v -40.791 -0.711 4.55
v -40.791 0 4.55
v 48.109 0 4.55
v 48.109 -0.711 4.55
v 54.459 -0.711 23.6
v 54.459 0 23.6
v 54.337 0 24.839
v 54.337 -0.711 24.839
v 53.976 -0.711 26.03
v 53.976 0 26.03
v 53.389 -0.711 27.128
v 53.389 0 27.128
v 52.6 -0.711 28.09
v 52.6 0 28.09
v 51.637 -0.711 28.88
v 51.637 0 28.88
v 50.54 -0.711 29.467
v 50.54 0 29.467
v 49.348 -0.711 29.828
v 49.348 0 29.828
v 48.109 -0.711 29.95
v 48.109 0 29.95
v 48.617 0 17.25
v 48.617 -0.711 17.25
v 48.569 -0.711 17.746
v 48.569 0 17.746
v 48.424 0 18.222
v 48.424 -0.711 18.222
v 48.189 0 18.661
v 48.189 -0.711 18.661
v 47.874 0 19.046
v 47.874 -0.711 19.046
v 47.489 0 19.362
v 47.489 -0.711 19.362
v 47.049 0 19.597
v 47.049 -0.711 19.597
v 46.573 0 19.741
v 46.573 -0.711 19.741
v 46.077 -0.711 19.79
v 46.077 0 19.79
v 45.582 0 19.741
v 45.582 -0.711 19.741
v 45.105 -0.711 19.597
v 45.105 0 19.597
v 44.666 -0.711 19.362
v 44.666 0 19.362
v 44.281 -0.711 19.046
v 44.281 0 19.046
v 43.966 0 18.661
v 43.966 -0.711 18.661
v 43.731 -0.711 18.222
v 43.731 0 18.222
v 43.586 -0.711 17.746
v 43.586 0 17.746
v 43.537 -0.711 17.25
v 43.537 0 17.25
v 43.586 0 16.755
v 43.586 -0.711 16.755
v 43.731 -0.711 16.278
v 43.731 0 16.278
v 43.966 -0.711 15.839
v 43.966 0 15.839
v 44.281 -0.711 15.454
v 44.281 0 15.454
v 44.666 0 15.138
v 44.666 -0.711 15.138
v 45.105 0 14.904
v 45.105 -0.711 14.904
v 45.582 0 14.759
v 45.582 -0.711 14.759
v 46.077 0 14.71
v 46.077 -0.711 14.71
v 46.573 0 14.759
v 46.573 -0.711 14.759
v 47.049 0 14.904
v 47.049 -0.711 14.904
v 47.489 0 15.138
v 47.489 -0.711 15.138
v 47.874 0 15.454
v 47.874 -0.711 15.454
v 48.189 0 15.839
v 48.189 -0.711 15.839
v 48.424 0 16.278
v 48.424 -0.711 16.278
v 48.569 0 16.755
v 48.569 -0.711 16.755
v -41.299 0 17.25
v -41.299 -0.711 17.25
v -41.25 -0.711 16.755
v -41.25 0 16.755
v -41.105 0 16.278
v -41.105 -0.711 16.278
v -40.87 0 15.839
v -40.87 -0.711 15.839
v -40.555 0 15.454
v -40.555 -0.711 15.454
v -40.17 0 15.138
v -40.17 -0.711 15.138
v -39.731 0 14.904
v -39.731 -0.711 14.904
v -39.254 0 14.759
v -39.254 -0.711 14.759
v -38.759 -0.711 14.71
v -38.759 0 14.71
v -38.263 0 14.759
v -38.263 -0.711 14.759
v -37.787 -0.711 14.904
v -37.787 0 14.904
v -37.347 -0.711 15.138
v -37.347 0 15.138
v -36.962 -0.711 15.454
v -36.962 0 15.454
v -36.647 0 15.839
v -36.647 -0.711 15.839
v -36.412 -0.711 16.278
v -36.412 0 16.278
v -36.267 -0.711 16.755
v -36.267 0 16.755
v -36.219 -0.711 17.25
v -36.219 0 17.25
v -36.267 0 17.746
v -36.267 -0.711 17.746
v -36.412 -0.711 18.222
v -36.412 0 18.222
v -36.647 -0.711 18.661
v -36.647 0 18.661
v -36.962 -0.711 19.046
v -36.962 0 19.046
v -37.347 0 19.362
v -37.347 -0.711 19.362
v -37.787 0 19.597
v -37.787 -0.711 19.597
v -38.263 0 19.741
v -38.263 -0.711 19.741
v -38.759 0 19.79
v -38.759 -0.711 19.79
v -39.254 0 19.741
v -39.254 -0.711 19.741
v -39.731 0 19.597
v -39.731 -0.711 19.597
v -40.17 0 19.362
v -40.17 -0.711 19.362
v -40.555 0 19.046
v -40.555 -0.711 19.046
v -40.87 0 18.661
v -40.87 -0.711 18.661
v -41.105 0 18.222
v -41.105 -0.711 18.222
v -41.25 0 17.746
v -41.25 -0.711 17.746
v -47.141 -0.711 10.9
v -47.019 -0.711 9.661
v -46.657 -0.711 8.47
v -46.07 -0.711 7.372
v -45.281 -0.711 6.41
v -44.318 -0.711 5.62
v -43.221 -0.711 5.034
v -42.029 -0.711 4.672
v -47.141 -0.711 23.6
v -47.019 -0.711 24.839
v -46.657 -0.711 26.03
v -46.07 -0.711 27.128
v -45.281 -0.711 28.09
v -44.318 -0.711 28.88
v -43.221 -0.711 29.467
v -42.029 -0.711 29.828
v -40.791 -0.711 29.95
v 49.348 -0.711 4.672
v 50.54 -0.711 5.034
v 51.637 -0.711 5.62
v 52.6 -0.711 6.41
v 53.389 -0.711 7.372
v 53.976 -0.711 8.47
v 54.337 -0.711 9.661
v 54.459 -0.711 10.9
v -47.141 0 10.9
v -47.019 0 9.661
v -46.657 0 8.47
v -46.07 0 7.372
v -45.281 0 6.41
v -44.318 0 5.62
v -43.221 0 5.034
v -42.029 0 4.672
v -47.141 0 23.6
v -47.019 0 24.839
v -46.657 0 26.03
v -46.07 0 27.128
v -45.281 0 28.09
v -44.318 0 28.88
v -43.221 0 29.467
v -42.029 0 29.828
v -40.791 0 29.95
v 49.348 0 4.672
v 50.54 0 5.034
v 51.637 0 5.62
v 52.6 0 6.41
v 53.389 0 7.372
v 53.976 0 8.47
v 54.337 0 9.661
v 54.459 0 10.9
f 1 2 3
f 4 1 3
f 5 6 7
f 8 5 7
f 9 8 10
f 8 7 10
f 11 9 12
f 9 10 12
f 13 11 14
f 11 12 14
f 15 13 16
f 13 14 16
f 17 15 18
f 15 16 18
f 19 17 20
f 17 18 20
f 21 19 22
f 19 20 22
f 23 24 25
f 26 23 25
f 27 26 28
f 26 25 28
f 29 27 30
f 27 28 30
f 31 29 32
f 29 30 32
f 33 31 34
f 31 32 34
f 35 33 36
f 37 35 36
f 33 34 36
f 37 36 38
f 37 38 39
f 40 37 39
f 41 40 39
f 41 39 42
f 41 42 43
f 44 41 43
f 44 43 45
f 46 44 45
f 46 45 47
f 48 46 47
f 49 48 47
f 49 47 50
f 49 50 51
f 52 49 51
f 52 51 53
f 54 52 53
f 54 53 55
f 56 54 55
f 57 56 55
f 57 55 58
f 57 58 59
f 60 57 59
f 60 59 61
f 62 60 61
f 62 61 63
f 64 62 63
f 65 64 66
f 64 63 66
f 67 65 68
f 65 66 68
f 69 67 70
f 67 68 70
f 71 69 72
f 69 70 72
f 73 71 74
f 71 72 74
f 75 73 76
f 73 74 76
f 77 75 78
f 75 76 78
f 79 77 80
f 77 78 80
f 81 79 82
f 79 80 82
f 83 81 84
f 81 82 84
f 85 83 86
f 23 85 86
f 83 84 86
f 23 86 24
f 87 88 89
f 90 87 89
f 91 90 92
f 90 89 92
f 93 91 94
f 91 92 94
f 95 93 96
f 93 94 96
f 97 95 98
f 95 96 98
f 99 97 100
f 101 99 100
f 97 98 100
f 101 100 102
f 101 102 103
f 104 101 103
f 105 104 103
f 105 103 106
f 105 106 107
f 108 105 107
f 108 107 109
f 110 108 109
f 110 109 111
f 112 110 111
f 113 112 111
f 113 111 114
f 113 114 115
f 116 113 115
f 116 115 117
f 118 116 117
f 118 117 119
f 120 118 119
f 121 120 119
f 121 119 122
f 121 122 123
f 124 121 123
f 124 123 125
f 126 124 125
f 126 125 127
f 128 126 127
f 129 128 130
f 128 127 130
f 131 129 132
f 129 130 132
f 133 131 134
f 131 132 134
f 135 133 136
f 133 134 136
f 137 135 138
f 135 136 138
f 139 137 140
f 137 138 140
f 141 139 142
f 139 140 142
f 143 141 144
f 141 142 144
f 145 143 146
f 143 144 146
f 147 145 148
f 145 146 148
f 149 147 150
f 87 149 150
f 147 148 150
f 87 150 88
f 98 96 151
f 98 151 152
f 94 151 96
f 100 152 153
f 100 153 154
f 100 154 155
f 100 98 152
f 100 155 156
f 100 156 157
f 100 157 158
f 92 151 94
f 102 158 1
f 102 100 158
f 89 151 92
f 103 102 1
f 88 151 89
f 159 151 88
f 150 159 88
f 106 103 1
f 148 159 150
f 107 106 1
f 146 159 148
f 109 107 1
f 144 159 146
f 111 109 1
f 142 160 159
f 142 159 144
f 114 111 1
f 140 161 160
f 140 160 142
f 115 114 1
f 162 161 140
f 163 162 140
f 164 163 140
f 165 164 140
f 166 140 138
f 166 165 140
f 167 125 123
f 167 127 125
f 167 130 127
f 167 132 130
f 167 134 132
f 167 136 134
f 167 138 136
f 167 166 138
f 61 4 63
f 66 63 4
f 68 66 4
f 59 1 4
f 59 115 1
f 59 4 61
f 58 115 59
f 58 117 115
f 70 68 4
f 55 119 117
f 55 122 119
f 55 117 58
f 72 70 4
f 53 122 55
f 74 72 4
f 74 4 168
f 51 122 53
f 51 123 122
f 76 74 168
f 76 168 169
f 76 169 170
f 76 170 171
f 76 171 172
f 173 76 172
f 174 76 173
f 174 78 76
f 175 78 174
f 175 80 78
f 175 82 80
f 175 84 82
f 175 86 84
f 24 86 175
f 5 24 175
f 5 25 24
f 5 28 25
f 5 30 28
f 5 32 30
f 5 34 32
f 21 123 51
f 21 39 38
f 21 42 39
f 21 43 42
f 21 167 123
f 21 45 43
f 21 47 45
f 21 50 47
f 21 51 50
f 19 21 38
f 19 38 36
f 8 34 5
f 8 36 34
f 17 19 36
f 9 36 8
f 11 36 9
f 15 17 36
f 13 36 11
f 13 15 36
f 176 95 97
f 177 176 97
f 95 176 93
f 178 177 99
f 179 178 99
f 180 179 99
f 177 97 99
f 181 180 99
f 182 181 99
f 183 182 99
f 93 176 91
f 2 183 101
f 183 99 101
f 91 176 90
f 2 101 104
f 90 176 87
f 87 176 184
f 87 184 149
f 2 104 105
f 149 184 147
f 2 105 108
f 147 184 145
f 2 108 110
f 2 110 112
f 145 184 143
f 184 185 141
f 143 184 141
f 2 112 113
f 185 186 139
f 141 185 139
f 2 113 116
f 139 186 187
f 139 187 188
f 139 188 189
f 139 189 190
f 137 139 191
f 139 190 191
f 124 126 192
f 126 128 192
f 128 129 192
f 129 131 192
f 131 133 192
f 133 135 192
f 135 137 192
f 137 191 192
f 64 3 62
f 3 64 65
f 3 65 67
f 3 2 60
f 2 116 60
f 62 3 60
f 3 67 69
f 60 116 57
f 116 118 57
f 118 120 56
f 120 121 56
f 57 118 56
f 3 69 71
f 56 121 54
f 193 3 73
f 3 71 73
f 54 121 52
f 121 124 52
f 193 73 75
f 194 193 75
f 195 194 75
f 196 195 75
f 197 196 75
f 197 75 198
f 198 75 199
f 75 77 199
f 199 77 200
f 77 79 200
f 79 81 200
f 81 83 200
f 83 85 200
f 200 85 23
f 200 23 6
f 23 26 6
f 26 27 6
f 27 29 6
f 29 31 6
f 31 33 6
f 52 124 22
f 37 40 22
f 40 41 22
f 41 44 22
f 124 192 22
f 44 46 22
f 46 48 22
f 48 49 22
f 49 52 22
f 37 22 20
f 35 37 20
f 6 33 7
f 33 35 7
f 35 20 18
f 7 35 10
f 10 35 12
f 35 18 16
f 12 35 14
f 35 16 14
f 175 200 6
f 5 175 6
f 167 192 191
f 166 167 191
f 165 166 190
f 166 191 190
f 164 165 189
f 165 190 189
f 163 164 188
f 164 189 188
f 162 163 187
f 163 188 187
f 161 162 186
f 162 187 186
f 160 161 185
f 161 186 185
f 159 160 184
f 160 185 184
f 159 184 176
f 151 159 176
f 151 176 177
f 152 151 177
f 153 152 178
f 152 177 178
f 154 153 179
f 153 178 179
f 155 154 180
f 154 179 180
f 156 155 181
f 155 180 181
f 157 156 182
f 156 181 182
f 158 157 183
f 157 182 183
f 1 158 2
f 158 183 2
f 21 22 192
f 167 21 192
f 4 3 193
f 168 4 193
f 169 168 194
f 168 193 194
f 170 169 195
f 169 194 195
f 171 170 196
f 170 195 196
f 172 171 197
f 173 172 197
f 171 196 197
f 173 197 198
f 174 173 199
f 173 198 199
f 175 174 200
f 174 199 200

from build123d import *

# Parameters (mm, degrees)
F1_DEPTH = 0.7112
F2_R     = 2.54
F3_DEPTH = 25.4


with BuildPart() as f1:
    # F0 (on Front) → F1 (new body)
    with BuildSketch(Plane.XZ):
        with BuildLine():
            Line((48.109472, 29.950177), (-40.790528, 29.950177))
            ThreePointArc((-40.790528, 29.950177), (-45.280656, 28.090305), (-47.140528, 23.600177))
            Line((-47.140528, 23.600177), (-47.140528, 10.900177))
            ThreePointArc((-47.140528, 10.900177), (-45.280656, 6.410049), (-40.790528, 4.550177))
            Line((-40.790528, 4.550177), (48.109472, 4.550177))
            ThreePointArc((48.109472, 4.550177), (52.599601, 6.410049), (54.459472, 10.900177))
            Line((54.459472, 10.900177), (54.459472, 23.600177))
            ThreePointArc((54.459472, 23.600177), (52.599601, 28.090305), (48.109472, 29.950177))
        make_face()
    extrude(amount=F1_DEPTH)

    # F2 (on face) → F3 (cut)
    with BuildSketch(Plane.XZ.offset(0.7112)):
        with BuildLine():
            ThreePointArc((-36.218528, 17.250177), (-38.758528, 19.790177), (-41.298528, 17.250177))
            ThreePointArc((-41.298528, 17.250177), (-38.758528, 14.710177), (-36.218528, 17.250177))
        make_face()
        with Locations((46.077472, 17.250177)):
            Circle(F2_R)
    extrude(amount=-F3_DEPTH, mode=Mode.SUBTRACT)


solid = f1.part
